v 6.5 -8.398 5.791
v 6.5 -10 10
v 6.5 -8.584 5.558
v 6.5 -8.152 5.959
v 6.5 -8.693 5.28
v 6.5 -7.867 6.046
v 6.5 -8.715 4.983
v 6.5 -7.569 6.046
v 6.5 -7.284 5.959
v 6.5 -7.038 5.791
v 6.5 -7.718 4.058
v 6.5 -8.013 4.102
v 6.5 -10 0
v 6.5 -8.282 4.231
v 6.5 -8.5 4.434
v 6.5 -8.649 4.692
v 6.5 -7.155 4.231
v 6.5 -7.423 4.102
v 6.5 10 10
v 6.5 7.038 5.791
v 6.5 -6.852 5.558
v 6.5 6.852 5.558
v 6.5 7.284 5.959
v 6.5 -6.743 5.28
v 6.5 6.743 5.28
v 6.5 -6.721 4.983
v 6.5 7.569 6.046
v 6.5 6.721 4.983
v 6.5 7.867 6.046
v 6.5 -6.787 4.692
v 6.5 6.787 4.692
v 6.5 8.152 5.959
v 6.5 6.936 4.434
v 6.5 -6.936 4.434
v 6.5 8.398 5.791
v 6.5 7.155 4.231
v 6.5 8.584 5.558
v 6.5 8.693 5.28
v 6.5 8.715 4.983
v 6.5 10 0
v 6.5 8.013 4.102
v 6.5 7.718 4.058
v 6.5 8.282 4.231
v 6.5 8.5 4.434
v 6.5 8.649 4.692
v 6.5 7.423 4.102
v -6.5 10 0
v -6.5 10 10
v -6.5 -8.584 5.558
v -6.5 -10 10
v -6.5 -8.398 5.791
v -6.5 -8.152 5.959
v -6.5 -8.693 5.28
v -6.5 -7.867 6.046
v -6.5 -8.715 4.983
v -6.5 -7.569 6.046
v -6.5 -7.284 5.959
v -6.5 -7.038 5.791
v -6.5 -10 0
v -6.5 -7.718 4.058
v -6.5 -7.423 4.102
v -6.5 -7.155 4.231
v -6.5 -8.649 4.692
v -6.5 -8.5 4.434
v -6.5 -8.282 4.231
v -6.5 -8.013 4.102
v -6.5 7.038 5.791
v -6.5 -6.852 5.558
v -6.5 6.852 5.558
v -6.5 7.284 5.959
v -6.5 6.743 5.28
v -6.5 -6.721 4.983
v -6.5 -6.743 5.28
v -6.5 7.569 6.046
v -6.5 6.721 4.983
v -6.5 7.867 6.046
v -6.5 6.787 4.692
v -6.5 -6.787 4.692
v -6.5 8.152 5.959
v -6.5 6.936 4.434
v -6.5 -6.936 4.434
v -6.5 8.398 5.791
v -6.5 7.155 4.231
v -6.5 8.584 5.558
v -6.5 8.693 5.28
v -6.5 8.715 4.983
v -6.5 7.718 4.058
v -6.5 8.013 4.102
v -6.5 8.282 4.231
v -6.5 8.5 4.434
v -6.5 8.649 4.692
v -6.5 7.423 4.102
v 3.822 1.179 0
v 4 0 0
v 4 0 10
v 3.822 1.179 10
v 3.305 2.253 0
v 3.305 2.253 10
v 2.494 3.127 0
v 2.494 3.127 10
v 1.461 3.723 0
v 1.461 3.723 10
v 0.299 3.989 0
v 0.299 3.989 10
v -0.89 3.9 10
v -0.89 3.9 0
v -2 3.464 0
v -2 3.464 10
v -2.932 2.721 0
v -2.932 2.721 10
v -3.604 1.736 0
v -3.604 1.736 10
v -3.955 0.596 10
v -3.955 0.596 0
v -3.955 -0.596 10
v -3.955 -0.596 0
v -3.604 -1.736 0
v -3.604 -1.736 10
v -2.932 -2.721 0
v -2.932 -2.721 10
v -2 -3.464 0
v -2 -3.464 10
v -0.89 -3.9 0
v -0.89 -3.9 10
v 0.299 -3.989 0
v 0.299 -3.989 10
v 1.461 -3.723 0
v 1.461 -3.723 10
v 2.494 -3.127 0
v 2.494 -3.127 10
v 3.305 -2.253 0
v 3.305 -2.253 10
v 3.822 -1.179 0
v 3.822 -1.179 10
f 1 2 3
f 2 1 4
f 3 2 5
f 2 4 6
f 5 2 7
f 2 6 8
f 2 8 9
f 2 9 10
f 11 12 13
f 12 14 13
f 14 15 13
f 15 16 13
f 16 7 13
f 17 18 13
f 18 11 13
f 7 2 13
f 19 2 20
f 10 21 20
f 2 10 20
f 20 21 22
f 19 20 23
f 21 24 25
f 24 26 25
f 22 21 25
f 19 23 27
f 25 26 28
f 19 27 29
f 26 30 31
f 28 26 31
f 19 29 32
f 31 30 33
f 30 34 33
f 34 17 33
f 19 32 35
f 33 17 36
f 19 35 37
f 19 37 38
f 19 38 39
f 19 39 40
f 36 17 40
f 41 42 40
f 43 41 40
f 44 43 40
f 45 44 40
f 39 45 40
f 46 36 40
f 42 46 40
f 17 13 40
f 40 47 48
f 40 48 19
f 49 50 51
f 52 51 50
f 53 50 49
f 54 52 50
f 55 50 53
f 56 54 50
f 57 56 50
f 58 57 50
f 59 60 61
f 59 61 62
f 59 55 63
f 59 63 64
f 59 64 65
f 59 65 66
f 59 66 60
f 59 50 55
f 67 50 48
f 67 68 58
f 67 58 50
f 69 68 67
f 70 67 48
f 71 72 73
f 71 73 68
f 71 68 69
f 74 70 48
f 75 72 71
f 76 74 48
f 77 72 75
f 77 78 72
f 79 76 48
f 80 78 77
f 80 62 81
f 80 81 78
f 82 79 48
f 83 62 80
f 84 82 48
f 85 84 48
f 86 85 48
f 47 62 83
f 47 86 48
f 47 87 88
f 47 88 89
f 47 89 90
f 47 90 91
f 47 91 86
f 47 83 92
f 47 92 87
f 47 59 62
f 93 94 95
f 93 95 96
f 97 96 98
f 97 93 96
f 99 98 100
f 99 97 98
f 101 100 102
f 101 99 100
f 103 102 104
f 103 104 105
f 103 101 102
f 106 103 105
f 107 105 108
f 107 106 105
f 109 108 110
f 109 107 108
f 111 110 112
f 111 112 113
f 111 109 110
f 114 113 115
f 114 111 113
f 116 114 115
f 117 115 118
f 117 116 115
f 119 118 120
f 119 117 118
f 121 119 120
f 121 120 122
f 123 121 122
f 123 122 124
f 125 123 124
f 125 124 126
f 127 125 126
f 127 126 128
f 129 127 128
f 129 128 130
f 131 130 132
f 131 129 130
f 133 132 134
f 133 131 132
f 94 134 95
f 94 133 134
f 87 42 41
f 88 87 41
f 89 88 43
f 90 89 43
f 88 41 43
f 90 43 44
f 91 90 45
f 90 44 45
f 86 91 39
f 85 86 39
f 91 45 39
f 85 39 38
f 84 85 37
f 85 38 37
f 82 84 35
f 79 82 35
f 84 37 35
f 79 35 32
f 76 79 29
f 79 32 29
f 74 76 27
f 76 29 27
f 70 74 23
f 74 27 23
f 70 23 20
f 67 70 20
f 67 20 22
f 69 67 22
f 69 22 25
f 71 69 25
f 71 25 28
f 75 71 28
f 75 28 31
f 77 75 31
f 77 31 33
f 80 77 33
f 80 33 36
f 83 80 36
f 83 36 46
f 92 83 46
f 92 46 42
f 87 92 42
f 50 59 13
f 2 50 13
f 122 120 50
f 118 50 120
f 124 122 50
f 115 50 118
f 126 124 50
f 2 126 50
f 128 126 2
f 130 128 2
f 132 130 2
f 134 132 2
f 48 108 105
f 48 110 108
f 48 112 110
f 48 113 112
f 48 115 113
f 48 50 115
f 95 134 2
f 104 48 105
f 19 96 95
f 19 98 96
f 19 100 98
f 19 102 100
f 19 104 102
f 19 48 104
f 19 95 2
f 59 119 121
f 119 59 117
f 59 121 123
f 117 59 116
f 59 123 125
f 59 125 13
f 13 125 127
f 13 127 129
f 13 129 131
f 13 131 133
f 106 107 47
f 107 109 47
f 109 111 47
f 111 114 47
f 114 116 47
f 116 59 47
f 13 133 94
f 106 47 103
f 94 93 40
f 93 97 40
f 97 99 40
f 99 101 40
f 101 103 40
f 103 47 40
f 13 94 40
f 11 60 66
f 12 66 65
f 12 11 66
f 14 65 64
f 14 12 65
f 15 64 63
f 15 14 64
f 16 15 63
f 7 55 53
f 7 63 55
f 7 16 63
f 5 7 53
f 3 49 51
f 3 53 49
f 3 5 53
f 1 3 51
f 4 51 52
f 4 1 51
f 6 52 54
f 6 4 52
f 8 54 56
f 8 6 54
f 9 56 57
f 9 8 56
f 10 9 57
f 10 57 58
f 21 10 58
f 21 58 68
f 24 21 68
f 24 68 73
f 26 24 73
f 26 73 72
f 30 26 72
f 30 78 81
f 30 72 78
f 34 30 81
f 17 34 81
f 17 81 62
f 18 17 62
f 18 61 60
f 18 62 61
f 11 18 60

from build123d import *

# Parameters (mm, degrees)
SKETCH1_W           = 13
SKETCH1_H           = 20
SKETCH1_R           = 4
BOSS_EXTRUDE1_DEPTH = 10
SKETCH2_R           = 1
CUT_EXTRUDE1_DEPTH  = 20.209372712


with BuildPart() as part:
    # Sketch1 → Boss-Extrude1 (new body)
    with BuildSketch(Plane.XY):
        Rectangle(SKETCH1_W, SKETCH1_H)
        Circle(SKETCH1_R, mode=Mode.SUBTRACT)
    extrude(amount=BOSS_EXTRUDE1_DEPTH)

    # Sketch2 → Cut-Extrude1 (cut, through all)
    with BuildSketch(Plane(origin=(6.5, 0, 0), x_dir=(0, 0, -1), z_dir=(1, 0, 0))):
        with Locations((-5.057573934, 7.718180526)):
            Circle(SKETCH2_R)
    cut_extrude1 = extrude(amount=-CUT_EXTRUDE1_DEPTH, mode=Mode.SUBTRACT)

    # Mirror1: Cut-Extrude1 across plane
    add(cut_extrude1.mirror(Plane.ZX), mode=Mode.SUBTRACT)


solid = part.part
